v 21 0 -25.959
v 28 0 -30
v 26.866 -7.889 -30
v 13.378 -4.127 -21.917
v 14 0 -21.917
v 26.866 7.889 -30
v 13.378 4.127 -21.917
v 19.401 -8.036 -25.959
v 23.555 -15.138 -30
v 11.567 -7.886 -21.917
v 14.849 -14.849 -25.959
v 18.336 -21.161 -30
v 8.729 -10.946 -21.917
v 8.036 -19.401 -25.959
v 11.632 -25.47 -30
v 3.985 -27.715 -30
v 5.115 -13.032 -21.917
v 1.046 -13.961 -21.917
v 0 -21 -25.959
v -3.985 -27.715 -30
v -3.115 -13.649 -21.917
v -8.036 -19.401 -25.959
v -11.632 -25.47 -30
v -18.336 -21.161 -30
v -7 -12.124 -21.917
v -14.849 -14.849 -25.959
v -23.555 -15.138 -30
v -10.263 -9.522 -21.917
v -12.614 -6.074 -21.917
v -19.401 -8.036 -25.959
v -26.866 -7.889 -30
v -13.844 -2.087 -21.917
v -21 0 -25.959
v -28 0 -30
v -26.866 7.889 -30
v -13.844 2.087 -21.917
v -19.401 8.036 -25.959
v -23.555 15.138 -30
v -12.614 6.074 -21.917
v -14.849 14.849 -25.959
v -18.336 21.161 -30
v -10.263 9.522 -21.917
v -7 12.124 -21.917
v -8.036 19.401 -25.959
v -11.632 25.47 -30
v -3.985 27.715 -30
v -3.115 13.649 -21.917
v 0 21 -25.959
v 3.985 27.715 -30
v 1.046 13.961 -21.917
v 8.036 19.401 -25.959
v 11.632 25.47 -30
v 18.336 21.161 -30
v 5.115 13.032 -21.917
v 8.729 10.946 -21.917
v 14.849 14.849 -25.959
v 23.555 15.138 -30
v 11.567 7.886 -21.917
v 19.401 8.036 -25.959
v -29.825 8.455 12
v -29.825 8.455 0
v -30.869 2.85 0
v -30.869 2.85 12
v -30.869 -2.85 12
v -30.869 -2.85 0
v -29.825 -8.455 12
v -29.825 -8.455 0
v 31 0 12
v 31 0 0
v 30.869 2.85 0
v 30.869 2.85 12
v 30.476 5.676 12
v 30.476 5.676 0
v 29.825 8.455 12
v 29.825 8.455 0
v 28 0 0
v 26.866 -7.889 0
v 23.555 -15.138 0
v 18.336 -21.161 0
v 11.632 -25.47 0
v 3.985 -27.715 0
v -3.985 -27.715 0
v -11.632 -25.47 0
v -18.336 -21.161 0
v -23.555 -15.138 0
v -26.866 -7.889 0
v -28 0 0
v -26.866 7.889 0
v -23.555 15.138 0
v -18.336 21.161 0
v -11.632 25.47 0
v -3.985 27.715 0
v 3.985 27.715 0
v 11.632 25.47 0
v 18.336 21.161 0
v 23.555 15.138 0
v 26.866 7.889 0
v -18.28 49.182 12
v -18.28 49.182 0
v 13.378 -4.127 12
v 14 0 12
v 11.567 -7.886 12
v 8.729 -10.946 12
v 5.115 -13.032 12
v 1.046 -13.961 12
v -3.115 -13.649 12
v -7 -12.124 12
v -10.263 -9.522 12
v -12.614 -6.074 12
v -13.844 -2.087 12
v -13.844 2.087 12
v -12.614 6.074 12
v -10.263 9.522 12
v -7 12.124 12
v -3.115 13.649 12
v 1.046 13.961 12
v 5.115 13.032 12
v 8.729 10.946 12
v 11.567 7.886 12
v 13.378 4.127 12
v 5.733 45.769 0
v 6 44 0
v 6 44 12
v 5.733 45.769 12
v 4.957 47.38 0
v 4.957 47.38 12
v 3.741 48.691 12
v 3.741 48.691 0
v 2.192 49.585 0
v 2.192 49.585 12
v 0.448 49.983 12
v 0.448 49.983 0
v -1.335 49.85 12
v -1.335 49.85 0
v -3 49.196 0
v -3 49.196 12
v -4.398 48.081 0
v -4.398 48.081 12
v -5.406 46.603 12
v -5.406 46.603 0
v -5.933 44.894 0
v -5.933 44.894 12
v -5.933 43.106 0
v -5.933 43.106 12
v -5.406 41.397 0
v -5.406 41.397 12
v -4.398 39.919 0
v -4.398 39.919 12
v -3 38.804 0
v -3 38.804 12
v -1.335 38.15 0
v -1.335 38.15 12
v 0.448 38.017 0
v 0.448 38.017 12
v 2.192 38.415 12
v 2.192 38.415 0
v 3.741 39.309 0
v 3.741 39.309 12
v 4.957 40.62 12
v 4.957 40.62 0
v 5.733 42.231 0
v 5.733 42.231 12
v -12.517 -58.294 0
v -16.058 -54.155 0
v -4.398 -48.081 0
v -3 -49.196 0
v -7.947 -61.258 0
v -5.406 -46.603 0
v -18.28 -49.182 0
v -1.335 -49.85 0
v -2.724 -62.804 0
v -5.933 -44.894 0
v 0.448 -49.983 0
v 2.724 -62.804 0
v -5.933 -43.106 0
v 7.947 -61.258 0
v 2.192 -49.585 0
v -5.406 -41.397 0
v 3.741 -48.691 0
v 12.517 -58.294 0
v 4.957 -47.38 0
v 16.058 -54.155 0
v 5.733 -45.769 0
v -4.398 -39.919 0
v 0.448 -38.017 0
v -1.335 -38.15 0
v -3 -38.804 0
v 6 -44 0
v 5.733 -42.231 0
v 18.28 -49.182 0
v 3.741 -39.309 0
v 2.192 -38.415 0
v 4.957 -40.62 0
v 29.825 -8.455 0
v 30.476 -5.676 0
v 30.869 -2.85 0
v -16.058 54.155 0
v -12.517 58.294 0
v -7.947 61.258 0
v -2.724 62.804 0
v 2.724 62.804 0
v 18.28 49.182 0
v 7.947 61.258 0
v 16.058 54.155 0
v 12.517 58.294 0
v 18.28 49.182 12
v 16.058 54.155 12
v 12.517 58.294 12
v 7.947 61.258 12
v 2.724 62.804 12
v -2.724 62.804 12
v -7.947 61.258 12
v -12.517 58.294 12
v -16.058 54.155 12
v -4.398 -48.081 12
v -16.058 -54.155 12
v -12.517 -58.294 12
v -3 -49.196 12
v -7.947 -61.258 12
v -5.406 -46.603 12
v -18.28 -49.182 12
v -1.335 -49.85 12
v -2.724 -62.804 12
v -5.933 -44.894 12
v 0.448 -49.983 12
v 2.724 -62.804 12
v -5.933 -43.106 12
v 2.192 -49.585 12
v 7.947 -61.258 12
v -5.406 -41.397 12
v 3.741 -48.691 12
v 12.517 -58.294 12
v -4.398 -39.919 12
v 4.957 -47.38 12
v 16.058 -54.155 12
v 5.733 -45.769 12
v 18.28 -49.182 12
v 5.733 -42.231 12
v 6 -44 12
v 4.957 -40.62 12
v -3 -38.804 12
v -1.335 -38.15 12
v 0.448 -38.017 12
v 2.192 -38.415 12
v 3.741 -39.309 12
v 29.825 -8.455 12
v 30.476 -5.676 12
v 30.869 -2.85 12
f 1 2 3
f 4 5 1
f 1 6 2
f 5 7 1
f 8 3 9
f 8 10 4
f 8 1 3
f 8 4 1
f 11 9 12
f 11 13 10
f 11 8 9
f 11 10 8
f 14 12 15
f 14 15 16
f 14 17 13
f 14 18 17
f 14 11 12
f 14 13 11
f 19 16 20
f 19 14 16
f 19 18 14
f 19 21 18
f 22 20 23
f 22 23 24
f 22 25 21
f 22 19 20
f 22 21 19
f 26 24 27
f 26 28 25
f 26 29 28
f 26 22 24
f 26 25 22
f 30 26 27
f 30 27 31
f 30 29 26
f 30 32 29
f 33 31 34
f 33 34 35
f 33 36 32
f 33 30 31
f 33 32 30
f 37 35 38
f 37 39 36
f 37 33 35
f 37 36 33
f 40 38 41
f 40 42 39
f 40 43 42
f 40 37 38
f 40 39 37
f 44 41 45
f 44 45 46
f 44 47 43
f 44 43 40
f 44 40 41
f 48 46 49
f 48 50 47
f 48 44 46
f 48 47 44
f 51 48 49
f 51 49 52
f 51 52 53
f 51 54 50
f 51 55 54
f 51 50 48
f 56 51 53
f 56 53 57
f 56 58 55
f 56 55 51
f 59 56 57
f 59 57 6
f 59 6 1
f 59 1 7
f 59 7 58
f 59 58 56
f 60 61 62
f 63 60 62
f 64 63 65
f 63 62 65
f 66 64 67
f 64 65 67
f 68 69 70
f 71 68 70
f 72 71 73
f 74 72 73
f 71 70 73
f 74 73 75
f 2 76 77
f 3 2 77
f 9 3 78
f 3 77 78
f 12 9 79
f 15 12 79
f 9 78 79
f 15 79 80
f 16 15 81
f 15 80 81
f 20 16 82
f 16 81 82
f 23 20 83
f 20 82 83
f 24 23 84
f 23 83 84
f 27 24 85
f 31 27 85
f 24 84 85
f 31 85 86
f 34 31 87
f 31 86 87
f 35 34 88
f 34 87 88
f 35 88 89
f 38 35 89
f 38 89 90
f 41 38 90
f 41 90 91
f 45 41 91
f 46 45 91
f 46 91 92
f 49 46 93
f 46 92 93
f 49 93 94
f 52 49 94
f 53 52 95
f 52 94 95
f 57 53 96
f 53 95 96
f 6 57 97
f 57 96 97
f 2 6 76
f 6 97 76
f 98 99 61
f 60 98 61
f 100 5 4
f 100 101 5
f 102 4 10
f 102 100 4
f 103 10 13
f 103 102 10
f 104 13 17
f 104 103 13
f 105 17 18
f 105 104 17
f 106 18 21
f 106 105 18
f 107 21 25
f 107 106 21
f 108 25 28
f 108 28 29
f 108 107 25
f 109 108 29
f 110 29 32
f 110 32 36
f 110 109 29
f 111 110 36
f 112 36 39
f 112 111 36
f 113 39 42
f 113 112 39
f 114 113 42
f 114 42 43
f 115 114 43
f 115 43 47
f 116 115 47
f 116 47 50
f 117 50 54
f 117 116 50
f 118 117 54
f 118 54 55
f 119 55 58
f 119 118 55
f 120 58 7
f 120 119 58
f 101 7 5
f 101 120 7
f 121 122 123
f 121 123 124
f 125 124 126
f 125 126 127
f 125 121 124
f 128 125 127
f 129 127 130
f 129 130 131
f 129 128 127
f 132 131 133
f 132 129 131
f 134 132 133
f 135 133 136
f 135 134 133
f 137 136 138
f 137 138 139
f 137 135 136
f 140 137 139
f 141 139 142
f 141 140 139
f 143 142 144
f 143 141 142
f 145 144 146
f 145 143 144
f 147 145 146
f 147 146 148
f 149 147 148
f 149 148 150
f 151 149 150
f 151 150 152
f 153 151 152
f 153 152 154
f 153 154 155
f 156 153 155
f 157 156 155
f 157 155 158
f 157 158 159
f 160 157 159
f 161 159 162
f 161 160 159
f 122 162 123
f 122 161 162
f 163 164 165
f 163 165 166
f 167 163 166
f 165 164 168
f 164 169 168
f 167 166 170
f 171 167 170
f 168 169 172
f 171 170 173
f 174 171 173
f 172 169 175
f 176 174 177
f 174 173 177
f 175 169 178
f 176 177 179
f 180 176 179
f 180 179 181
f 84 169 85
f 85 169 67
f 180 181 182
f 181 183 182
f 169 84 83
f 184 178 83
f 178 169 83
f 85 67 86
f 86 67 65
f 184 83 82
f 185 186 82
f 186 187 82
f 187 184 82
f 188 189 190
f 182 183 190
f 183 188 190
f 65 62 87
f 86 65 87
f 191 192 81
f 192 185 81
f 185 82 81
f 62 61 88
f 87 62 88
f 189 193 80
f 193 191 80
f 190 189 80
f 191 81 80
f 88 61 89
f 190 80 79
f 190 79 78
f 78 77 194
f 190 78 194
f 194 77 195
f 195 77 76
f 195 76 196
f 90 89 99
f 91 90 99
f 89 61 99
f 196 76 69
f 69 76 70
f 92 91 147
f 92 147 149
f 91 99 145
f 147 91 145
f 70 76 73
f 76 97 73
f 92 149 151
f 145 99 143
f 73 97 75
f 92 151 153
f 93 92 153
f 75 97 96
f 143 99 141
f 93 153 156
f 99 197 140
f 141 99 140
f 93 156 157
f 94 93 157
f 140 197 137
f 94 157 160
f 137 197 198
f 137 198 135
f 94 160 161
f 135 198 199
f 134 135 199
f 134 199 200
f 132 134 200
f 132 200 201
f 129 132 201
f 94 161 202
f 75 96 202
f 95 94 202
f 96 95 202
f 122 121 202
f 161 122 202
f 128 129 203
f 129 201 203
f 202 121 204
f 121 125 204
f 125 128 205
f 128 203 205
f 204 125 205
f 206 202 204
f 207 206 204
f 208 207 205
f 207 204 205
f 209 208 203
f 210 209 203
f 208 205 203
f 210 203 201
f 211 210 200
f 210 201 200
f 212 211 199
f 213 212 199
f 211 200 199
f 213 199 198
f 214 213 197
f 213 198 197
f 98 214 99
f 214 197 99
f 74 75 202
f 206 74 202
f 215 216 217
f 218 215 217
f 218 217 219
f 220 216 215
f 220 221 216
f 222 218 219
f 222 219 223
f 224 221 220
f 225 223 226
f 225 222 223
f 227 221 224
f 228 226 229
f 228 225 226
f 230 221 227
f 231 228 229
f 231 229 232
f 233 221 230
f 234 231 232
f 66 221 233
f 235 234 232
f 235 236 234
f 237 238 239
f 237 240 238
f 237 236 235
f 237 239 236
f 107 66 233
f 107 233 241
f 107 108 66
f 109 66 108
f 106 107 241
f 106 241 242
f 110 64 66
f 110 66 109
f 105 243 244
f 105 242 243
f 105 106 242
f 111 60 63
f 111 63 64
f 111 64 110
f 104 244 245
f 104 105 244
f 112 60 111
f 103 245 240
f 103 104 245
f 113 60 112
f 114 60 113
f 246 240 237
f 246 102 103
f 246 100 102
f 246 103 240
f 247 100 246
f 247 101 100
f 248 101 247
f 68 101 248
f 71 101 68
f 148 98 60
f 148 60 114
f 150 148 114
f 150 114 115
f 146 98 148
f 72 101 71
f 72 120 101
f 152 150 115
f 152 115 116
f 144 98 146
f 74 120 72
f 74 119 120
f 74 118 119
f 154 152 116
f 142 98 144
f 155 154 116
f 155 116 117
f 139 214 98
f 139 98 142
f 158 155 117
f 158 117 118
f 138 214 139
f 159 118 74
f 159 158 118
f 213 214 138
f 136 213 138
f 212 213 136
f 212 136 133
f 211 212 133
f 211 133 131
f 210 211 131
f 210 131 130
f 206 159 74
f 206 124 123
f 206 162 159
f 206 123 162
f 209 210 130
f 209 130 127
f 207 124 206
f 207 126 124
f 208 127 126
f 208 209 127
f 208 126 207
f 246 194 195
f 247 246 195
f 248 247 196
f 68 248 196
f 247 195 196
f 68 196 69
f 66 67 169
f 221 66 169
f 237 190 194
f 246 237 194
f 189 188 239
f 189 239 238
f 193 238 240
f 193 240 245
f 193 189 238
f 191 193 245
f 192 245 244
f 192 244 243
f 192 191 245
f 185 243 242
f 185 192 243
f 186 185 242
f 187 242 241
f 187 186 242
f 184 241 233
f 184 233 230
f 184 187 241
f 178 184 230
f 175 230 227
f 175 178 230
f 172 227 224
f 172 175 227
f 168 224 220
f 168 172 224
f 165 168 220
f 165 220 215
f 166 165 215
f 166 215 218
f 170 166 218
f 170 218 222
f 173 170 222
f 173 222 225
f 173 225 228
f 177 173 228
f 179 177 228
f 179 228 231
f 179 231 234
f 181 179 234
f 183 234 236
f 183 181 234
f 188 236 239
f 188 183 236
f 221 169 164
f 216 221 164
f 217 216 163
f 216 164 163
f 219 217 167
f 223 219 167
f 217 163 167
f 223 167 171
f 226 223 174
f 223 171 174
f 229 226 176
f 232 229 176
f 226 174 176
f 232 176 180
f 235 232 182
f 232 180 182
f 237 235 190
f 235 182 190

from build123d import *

# Parameters (mm, degrees)
F0_R     = 6
F0_R_2   = 14
F1_DEPTH = 12
F2_R     = 28
F2_R_2   = 14
F3_DEPTH = 30


with BuildPart() as f1:
    # F0 (on Top) → F1 (new body)
    with BuildSketch(Plane.XY):
        with BuildLine():
            ThreePointArc((11.4242022345, 28.8181818182), (17.0008800133, 35.5164819342), (19, 44))
            ThreePointArc((19, 44), (18.8190726431, 46.6158182), (18.279736331, 49.1818181818))
            ThreePointArc((18.279736331, 49.1818181818), (0, 63), (-18.279736331, 49.1818181818))
            ThreePointArc((-18.279736331, 49.1818181818), (-18.0069545749, 37.9378562425), (-11.4242022345, 28.8181818182))
            ThreePointArc((-11.4242022345, 28.8181818182), (0, 31), (11.4242022345, 28.8181818182))
        make_face()
        with Locations((0, 44)):
            Circle(F0_R, mode=Mode.SUBTRACT)
        with BuildLine():
            ThreePointArc((-11.4242022345, 28.8181818182), (-18.0069545749, 37.9378562425), (-18.279736331, 49.1818181818))
            Line((-18.279736331, 49.1818181818), (-29.8248329611, 8.4545454545))
            ThreePointArc((-29.8248329611, 8.4545454545), (-23.000872758, 20.7836438665), (-11.4242022345, 28.8181818182))
        make_face()
        with BuildLine():
            ThreePointArc((18.279736331, 49.1818181818), (18.8190726431, 46.6158182), (19, 44))
            ThreePointArc((19, 44), (17.0008800133, 35.5164819342), (11.4242022345, 28.8181818182))
            ThreePointArc((11.4242022345, 28.8181818182), (23.000872758, 20.7836438665), (29.8248329611, 8.4545454545))
            Line((29.8248329611, 8.4545454545), (18.279736331, 49.1818181818))
        make_face()
        with BuildLine():
            ThreePointArc((-11.4242022345, 28.8181818182), (0, 25), (11.4242022345, 28.8181818182))
            ThreePointArc((11.4242022345, 28.8181818182), (0, 31), (-11.4242022345, 28.8181818182))
        make_face()
        with BuildLine():
            ThreePointArc((29.8248329611, 8.4545454545), (23.000872758, 20.7836438665), (11.4242022345, 28.8181818182))
            ThreePointArc((11.4242022345, 28.8181818182), (0, 25), (-11.4242022345, 28.8181818182))
            ThreePointArc((-11.4242022345, 28.8181818182), (-23.000872758, 20.7836438665), (-29.8248329611, 8.4545454545))
            ThreePointArc((-29.8248329611, 8.4545454545), (-31, 0), (-29.8248329611, -8.4545454545))
            ThreePointArc((-29.8248329611, -8.4545454545), (-23.000872758, -20.7836438665), (-11.4242022345, -28.8181818182))
            ThreePointArc((-11.4242022345, -28.8181818182), (0, -25), (11.4242022345, -28.8181818182))
            ThreePointArc((11.4242022345, -28.8181818182), (23.000872758, -20.7836438665), (29.8248329611, -8.4545454545))
            ThreePointArc((29.8248329611, -8.4545454545), (30.7048027334, -4.2679139053), (31, 0))
            ThreePointArc((31, 0), (30.7048027334, 4.2679139053), (29.8248329611, 8.4545454545))
        make_face()
        Circle(F0_R_2, mode=Mode.SUBTRACT)
        with BuildLine():
            ThreePointArc((11.4242022345, -28.8181818182), (0, -25), (-11.4242022345, -28.8181818182))
            ThreePointArc((-11.4242022345, -28.8181818182), (0, -31), (11.4242022345, -28.8181818182))
        make_face()
        with BuildLine():
            ThreePointArc((-11.4242022345, -28.8181818182), (-23.000872758, -20.7836438665), (-29.8248329611, -8.4545454545))
            Line((-29.8248329611, -8.4545454545), (-18.279736331, -49.1818181818))
            ThreePointArc((-18.279736331, -49.1818181818), (-18.0069545749, -37.9378562425), (-11.4242022345, -28.8181818182))
        make_face()
        with BuildLine():
            Line((18.279736331, -49.1818181818), (29.8248329611, -8.4545454545))
            ThreePointArc((29.8248329611, -8.4545454545), (23.000872758, -20.7836438665), (11.4242022345, -28.8181818182))
            ThreePointArc((11.4242022345, -28.8181818182), (17.0008800133, -35.5164819342), (19, -44))
            ThreePointArc((19, -44), (18.8190726431, -46.6158182), (18.279736331, -49.1818181818))
        make_face()
        with BuildLine():
            ThreePointArc((11.4242022345, -28.8181818182), (0, -31), (-11.4242022345, -28.8181818182))
            ThreePointArc((-11.4242022345, -28.8181818182), (-18.0069545749, -37.9378562425), (-18.279736331, -49.1818181818))
            ThreePointArc((-18.279736331, -49.1818181818), (0, -63), (18.279736331, -49.1818181818))
            ThreePointArc((18.279736331, -49.1818181818), (18.8190726431, -46.6158182), (19, -44))
            ThreePointArc((19, -44), (17.0008800133, -35.5164819342), (11.4242022345, -28.8181818182))
        make_face()
        with Locations((0, -44)):
            Circle(F0_R, mode=Mode.SUBTRACT)
    extrude(amount=F1_DEPTH)

    # F2 (on face) → F3 (join)
    with BuildSketch(Plane(origin=(0, 0, 0), x_dir=(1, 0, 0), z_dir=(0, 0, -1))):
        Circle(F2_R)
        Circle(F2_R_2, mode=Mode.SUBTRACT)
    extrude(amount=F3_DEPTH)

    # F4 (on Front) → F5 (revolve, cut)
    with BuildSketch(Plane.XZ):
        Polygon((28, -30), (14, -21.9170962313), (14, -30), align=None)
    revolve(axis=Axis((0, 0, -30), (0, 0, -1)), mode=Mode.SUBTRACT)


solid = f1.part
